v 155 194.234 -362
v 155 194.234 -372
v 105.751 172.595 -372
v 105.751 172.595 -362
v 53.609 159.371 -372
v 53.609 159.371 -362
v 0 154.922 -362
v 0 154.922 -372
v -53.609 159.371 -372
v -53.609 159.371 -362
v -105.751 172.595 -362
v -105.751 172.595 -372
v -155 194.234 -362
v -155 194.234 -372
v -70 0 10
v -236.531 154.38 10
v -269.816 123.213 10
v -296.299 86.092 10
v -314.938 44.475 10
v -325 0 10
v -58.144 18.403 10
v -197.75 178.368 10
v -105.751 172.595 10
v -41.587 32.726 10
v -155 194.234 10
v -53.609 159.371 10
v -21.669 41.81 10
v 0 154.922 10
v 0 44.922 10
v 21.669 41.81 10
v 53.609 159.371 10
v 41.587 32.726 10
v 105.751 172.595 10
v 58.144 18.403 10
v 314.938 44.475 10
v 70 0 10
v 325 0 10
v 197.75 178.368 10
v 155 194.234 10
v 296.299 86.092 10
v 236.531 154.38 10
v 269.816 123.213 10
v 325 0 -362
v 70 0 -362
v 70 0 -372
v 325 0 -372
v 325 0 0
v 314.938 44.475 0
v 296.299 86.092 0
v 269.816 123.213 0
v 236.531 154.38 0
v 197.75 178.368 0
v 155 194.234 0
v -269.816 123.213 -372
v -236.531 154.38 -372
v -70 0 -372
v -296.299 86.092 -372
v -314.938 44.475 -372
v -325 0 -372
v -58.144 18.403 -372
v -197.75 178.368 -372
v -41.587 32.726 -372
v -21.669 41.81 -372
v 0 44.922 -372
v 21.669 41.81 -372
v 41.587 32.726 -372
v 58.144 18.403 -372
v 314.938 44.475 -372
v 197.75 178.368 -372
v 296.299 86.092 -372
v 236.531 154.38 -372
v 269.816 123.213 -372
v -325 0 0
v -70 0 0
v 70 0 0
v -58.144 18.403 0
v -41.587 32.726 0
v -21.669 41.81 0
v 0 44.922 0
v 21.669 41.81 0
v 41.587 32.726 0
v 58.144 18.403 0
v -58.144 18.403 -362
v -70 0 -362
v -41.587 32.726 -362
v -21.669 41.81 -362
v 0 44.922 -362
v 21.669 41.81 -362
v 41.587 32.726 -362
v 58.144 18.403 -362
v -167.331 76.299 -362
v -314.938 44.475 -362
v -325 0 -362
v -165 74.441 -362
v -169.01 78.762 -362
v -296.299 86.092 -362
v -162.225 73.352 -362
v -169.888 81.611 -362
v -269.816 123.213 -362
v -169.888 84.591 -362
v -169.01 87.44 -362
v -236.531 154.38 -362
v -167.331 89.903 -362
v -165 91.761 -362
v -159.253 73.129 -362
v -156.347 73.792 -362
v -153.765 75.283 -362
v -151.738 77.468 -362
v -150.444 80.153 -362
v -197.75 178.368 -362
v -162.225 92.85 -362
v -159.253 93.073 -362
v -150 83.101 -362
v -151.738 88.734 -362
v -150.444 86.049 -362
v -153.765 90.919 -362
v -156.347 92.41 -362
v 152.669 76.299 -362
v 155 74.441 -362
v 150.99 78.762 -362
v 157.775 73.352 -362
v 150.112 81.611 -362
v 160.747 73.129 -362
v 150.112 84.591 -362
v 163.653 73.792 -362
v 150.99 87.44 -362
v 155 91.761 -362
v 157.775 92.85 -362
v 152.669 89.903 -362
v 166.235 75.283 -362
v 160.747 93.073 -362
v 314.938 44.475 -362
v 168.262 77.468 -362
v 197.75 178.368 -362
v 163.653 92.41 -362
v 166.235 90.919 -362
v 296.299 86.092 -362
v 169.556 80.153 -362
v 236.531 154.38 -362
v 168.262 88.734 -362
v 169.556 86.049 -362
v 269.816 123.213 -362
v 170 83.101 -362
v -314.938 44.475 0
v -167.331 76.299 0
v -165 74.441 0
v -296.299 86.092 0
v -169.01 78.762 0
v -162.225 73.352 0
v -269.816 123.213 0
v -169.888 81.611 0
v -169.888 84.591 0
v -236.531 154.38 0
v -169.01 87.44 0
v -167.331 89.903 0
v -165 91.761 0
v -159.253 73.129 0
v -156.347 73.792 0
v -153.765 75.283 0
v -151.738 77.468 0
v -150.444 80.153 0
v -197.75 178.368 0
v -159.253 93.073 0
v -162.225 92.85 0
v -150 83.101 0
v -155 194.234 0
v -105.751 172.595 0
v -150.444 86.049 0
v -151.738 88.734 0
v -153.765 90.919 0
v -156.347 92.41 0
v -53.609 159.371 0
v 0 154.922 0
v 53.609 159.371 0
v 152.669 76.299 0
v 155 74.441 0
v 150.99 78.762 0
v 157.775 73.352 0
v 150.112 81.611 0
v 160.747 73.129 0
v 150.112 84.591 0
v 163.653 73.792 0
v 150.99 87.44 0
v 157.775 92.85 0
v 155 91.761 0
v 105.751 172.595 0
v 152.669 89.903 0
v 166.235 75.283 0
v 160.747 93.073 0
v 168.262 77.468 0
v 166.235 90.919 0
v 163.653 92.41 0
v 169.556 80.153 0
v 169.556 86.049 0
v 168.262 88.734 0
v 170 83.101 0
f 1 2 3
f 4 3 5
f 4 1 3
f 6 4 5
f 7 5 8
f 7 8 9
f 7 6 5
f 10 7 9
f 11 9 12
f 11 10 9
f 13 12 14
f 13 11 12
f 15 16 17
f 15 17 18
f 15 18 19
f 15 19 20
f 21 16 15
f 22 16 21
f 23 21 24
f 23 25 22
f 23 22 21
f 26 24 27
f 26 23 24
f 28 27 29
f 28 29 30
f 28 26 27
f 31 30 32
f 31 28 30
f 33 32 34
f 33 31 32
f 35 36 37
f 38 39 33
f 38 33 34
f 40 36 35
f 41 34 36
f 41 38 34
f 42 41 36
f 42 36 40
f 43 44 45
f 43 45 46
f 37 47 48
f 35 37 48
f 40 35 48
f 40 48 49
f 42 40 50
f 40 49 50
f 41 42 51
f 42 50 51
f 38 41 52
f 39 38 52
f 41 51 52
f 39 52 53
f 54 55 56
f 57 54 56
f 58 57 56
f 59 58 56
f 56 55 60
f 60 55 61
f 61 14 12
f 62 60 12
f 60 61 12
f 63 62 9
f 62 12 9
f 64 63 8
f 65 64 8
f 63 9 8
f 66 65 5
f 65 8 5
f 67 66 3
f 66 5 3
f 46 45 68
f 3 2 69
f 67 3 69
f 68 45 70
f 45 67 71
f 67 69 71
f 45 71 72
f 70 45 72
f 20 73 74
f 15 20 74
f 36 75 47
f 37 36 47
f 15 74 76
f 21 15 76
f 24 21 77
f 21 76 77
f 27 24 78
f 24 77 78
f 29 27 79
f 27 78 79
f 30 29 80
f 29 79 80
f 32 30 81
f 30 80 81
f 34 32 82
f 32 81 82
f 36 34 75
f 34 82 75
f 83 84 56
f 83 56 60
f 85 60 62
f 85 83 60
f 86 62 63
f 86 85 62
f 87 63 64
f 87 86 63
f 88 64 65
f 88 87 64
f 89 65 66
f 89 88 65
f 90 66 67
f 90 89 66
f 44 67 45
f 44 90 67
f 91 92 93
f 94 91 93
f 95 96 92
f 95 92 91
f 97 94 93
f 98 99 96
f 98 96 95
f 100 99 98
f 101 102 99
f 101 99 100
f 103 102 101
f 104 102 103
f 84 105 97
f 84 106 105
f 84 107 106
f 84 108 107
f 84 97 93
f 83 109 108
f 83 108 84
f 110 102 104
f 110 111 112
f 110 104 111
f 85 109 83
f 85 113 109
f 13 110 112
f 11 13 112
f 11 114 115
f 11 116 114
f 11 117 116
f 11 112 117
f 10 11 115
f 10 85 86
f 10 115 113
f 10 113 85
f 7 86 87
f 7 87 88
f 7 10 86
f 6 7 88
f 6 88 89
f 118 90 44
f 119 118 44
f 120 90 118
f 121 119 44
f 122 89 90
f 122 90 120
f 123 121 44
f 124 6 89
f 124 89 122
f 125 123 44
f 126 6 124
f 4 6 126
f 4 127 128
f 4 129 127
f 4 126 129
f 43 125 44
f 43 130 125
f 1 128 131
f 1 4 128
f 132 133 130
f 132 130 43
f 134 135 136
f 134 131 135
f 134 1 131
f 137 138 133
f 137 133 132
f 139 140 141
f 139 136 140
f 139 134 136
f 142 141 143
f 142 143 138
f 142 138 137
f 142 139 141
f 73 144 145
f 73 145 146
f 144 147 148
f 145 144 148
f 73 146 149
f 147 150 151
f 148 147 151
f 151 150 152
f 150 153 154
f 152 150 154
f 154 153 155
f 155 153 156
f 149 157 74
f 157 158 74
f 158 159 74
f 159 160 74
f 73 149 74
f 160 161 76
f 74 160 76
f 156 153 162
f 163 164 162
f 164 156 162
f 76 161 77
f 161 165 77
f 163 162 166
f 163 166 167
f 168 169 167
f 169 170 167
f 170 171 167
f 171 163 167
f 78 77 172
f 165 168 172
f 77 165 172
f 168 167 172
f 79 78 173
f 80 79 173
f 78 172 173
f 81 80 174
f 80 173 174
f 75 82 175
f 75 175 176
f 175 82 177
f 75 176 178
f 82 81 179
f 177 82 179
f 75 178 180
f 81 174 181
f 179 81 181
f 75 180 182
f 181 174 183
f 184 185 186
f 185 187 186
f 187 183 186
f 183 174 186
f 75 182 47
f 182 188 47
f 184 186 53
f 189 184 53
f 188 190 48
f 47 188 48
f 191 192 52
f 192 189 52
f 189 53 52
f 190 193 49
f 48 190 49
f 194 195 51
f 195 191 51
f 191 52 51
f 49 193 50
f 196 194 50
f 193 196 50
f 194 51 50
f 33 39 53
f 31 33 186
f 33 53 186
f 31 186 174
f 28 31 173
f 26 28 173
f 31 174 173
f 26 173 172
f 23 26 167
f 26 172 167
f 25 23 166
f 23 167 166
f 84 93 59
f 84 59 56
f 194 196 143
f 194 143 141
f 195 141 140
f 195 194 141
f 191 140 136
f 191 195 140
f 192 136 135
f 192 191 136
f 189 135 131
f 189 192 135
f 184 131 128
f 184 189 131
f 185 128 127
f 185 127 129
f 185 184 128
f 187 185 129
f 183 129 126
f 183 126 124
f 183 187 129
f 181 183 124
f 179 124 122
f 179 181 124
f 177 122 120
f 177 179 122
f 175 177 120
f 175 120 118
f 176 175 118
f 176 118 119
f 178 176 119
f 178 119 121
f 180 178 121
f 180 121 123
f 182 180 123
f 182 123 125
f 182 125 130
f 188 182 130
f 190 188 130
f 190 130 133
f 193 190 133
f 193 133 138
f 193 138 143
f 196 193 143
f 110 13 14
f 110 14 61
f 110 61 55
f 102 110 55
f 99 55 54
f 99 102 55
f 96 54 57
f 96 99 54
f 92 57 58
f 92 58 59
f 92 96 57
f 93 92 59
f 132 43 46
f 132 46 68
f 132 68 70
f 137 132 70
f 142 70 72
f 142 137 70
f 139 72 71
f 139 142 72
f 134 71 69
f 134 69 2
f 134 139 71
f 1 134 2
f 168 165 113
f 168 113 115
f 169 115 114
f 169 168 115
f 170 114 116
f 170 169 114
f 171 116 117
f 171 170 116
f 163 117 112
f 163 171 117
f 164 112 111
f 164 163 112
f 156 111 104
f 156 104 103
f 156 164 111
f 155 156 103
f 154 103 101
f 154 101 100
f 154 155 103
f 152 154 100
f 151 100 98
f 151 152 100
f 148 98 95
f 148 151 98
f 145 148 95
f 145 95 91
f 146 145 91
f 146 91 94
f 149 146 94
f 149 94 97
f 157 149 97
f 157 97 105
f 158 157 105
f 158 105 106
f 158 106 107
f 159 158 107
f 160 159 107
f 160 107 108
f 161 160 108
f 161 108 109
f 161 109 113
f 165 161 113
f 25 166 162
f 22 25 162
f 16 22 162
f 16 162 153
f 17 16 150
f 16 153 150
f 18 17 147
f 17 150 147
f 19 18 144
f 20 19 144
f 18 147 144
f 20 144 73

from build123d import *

# Parameters (mm, degrees)
BOSS_EXTRUDE1_DEPTH = 10
BOSS_EXTRUDE2_DEPTH = 10
SKETCH3_R           = 10
BOSS_EXTRUDE3_DEPTH = 382


with BuildPart() as part:
    # Sketch1 → Boss-Extrude1 (new body)
    with BuildSketch(Plane.XY):
        with BuildLine():
            Line((-325, 0), (-70, 0))
            ThreePointArc((-70, 0), (0, 44.921970135), (70, 0))
            Line((70, 0), (325, 0))
            ThreePointArc((325, 0), (269.81612239, 123.213044268), (155, 194.233975444))
            ThreePointArc((155, 194.233975444), (0, 154.921970135), (-155, 194.233975444))
            ThreePointArc((-155, 194.233975444), (-269.81612239, 123.213044268), (-325, 0))
        make_face()
    extrude(amount=BOSS_EXTRUDE1_DEPTH)



with BuildPart() as body_2:
    # Sketch2 → Boss-Extrude2 (new body)
    with BuildSketch(Plane.XY.offset(-362)):
        with BuildLine():
            Line((70, 0), (325, 0))
            ThreePointArc((325, 0), (269.81612239, 123.213044268), (155, 194.233975444))
            ThreePointArc((155, 194.233975444), (0, 154.921970135), (-155, 194.233975444))
            ThreePointArc((-155, 194.233975444), (-269.81612239, 123.213044268), (-325, 0))
            Line((-325, 0), (-70, 0))
            ThreePointArc((-70, 0), (0, 44.921970135), (70, 0))
        make_face()
    extrude(amount=-BOSS_EXTRUDE2_DEPTH)


with BuildPart() as part_1:
    add(part.part)

    add(body_2.part)  # Boss-Extrude3 merges body 2
    # Sketch3 → Boss-Extrude3 (add)
    with BuildSketch(Plane.XY.offset(10)):
        with Locations((-160, 83.10096245)):
            Circle(SKETCH3_R)
        with Locations((160, 83.10096245)):
            Circle(SKETCH3_R)
    extrude(amount=-BOSS_EXTRUDE3_DEPTH)


solid = part_1.part
